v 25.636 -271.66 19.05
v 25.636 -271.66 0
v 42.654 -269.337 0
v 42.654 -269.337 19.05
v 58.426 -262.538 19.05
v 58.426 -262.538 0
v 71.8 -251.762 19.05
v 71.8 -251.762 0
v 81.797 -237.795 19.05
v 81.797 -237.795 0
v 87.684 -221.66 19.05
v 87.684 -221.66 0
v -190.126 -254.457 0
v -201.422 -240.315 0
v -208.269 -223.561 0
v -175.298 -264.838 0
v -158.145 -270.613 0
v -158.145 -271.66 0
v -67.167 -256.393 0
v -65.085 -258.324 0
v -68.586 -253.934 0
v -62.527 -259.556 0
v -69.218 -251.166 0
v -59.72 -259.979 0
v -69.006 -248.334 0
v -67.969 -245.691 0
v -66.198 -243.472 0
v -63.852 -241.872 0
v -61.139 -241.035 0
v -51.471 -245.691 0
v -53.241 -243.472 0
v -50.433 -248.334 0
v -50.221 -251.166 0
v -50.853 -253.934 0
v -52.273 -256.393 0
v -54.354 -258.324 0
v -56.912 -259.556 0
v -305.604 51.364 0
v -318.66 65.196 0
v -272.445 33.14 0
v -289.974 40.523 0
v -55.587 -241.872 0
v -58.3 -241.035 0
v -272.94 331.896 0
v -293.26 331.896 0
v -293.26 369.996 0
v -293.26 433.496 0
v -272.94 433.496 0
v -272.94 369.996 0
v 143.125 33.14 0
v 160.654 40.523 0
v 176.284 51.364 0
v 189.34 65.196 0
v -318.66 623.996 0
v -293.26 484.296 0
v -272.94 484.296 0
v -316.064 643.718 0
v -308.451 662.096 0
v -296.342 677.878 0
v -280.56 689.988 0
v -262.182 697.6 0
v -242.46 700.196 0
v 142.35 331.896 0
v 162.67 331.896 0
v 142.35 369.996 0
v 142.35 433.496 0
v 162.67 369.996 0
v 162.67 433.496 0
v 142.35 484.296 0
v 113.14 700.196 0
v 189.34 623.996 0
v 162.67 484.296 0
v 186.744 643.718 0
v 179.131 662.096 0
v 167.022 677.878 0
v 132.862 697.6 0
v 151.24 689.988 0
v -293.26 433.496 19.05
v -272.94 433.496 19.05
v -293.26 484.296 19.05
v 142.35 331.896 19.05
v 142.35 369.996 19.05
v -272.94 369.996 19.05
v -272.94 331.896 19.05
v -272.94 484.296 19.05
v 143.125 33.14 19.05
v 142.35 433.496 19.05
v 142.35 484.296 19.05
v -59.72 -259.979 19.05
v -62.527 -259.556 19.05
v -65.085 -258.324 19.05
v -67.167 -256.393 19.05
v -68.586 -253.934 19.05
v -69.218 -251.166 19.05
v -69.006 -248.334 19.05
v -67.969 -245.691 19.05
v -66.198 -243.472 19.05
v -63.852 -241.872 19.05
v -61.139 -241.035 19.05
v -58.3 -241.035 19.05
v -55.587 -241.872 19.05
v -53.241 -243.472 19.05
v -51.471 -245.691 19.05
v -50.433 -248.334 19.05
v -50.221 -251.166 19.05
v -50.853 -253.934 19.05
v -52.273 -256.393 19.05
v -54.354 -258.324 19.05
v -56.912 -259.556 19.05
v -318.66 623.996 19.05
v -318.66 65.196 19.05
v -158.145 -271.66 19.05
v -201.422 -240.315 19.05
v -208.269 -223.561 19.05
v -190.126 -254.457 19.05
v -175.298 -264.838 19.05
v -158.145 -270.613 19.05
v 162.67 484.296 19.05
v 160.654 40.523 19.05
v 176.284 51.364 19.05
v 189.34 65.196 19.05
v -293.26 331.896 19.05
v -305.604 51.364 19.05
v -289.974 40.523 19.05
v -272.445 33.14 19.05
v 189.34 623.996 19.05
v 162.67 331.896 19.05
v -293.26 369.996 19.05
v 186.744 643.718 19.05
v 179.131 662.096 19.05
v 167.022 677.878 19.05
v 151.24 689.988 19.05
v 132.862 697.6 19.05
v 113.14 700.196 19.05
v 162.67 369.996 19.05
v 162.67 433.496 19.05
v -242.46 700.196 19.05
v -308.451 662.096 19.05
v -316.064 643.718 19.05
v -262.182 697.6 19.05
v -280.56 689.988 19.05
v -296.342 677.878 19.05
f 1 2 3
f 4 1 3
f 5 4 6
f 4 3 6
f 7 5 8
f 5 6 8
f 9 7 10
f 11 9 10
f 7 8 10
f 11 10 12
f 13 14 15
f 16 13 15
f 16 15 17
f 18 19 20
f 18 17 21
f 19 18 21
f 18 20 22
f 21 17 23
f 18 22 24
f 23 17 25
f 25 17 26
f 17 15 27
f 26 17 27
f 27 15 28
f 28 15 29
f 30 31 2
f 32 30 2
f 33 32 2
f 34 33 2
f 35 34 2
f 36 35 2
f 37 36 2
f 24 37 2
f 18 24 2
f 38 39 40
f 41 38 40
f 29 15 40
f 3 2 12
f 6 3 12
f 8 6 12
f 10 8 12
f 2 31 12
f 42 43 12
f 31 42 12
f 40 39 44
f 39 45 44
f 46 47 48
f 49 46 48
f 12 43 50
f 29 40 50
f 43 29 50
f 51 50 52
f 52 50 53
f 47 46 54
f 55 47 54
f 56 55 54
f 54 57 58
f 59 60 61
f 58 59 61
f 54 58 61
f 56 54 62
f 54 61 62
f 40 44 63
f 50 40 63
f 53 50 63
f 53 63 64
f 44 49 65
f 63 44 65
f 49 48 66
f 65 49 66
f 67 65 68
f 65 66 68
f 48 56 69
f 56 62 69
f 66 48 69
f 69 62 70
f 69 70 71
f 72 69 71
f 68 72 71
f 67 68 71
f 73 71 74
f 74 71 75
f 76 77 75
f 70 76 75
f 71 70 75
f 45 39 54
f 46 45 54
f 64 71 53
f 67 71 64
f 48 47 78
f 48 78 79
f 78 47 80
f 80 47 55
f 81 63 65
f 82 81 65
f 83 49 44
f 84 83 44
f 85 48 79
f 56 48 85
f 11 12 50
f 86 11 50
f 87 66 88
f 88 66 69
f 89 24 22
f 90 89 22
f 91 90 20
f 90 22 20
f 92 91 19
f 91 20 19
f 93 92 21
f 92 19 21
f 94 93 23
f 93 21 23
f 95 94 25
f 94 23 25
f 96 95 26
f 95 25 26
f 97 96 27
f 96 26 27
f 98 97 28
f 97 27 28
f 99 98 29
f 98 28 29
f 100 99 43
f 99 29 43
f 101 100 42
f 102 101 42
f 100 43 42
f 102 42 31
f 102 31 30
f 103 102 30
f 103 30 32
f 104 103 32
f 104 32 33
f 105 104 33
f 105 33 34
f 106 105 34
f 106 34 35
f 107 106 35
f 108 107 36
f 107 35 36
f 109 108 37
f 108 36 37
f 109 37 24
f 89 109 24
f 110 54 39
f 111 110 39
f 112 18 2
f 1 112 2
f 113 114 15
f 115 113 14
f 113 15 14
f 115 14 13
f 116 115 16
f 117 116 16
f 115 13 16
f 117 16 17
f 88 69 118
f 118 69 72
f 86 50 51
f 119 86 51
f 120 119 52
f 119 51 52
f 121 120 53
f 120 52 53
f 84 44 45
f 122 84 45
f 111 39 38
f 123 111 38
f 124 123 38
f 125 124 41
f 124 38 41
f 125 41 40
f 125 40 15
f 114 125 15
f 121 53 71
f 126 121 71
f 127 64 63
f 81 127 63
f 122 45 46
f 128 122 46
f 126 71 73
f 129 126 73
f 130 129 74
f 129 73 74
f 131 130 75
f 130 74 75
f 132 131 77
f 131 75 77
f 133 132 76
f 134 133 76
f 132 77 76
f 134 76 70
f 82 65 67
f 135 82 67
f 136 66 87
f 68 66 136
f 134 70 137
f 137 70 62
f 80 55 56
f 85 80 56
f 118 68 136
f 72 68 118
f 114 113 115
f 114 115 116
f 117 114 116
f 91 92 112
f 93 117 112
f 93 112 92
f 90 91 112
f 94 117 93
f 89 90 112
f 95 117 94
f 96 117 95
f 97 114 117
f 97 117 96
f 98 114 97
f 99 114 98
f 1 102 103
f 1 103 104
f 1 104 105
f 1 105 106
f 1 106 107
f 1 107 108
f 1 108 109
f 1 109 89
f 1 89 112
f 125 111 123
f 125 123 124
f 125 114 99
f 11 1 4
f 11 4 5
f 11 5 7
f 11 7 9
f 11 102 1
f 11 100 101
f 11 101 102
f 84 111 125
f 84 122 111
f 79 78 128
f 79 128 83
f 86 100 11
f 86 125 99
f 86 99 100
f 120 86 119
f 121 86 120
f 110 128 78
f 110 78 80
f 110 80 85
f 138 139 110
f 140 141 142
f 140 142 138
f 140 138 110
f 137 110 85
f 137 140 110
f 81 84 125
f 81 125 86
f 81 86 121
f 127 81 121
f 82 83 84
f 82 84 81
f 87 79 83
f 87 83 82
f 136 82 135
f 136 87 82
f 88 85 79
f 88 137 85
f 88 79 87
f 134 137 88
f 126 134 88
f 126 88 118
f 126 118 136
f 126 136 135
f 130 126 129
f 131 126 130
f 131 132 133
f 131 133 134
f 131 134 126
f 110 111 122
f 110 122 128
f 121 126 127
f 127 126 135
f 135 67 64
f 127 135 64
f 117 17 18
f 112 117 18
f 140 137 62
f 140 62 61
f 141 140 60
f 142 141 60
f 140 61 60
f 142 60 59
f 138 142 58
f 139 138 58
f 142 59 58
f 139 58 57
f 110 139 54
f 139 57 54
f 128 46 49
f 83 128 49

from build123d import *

# Parameters (mm, degrees)
F0_W     = 20.32
F0_H     = 50.8
F1_DEPTH = 19.05
F2_DEPTH = 19.05
F3_DEPTH = 19.05


with BuildPart() as f1:
    # F0 (on Top) → F1 (new body)
    with BuildSketch(Plane.XY):
        Polygon((-242.4599993661, 535.0964056902), (-318.6599993661, 535.0964056902), (-318.6599993661, 331.8964056902), (-293.2599993661, 331.8964056902), (-293.2599993661, 369.9964056902), (-272.9399993661, 369.9964056902), (-272.9399993661, 331.8964056902), (-242.4599993661, 331.8964056902), (-242.4599993661, 369.9964056902), align=None)
        with Locations((-283.0999993661, 458.8964056902)):
            Rectangle(F0_W, F0_H, mode=Mode.SUBTRACT)
        with BuildLine():
            Line((-64.6599993661, 535.0964056902), (-242.4599993661, 535.0964056902))
            Line((-242.4599993661, 535.0964056902), (-242.4599993661, 369.9964056902))
            Line((-242.4599993661, 369.9964056902), (-242.4599993661, 331.8964056902))
            Line((-242.4599993661, 331.8964056902), (-272.9399993661, 331.8964056902))
            Line((-272.9399993661, 331.8964056902), (-293.2599993661, 331.8964056902))
            Line((-293.2599993661, 331.8964056902), (-318.6599993661, 331.8964056902))
            Line((-318.6599993661, 331.8964056902), (-318.6599993661, 65.1964056902))
            ThreePointArc((-318.6599993661, 65.1964056902), (-298.0708378663, 45.5374634714), (-272.4446494724, 33.1404457322))
            Line((-272.4446494724, 33.1404457322), (-208.2693964249, -223.5605664576))
            ThreePointArc((-208.2693964249, -223.5605664576), (-190.125501362, -254.4571248379), (-158.1446494724, -270.6133422236))
            ThreePointArc((-158.1446494724, -270.6133422236), (-152.4287869516, -271.3974603653), (-146.6653476657, -271.6595542678))
            Line((-146.6653476657, -271.6595542678), (-120.0446494724, -271.6595542678))
            Line((-120.0446494724, -271.6595542678), (-59.7196494724, -271.6595542678))
            Line((-59.7196494724, -271.6595542678), (0.6053505276, -271.6595542678))
            Line((0.6053505276, -271.6595542678), (25.6361325915, -271.6595542678))
            ThreePointArc((25.6361325915, -271.6595542678), (65.4793211523, -257.6041730378), (87.6843615354, -221.6601944351))
            Line((87.6843615354, -221.6601944351), (143.1246507402, 33.1404457322))
            ThreePointArc((143.1246507402, 33.1404457322), (168.7508391341, 45.5374634714), (189.3400006339, 65.1964056902))
            Line((189.3400006339, 65.1964056902), (189.3400006339, 331.8964056902))
            Line((189.3400006339, 331.8964056902), (163.9400006339, 331.8964056902))
            Line((163.9400006339, 331.8964056902), (162.6700006339, 331.8964056902))
            Line((162.6700006339, 331.8964056902), (142.3500006339, 331.8964056902))
            Line((142.3500006339, 331.8964056902), (113.1400006339, 331.8964056902))
            Line((113.1400006339, 331.8964056902), (113.1400006339, 369.9964056902))
            Line((113.1400006339, 369.9964056902), (113.1400006339, 535.0964056902))
            Line((113.1400006339, 535.0964056902), (-64.6599993661, 535.0964056902))
        make_face()
        with BuildLine():
            ThreePointArc((-50.1946494724, -250.4539787769), (-52.9844573816, -257.1891708677), (-59.7196494724, -259.9789787769))
            ThreePointArc((-59.7196494724, -259.9789787769), (-66.4548415632, -243.7187866861), (-50.1946494724, -250.4539787769))
        make_face(mode=Mode.SUBTRACT)
        Polygon((189.3400006339, 535.0964056902), (113.1400006339, 535.0964056902), (113.1400006339, 369.9964056902), (113.1400006339, 331.8964056902), (142.3500006339, 331.8964056902), (142.3500006339, 369.9964056902), (162.6700006339, 369.9964056902), (162.6700006339, 331.8964056902), (163.9400006339, 331.8964056902), (189.3400006339, 331.8964056902), align=None)
        with Locations((152.5100006339, 458.8964056902)):
            Rectangle(F0_W, F0_H, mode=Mode.SUBTRACT)
    extrude(amount=F1_DEPTH)

    # F0 (on Top) → F2 (join)
    with BuildSketch(Plane.XY):
        with BuildLine():
            Line((-318.6599993661, 623.9964056902), (-318.6599993661, 535.0964056902))
            Line((-318.6599993661, 535.0964056902), (-242.4599993661, 535.0964056902))
            Line((-242.4599993661, 535.0964056902), (-64.6599993661, 535.0964056902))
            Line((-64.6599993661, 535.0964056902), (113.1400006339, 535.0964056902))
            Line((113.1400006339, 535.0964056902), (189.3400006339, 535.0964056902))
            Line((189.3400006339, 535.0964056902), (189.3400006339, 623.9964056902))
            ThreePointArc((189.3400006339, 623.9964056902), (167.0215373603, 677.8779424166), (113.1400006339, 700.1964056902))
            Line((113.1400006339, 700.1964056902), (-242.4599993661, 700.1964056902))
            ThreePointArc((-242.4599993661, 700.1964056902), (-296.3415360925, 677.8779424166), (-318.6599993661, 623.9964056902))
        make_face()
        Polygon((-242.4599993661, 535.0964056902), (-318.6599993661, 535.0964056902), (-318.6599993661, 331.8964056902), (-293.2599993661, 331.8964056902), (-293.2599993661, 369.9964056902), (-272.9399993661, 369.9964056902), (-272.9399993661, 331.8964056902), (-242.4599993661, 331.8964056902), (-242.4599993661, 369.9964056902), align=None)
        with Locations((-283.0999993661, 458.8964056902)):
            Rectangle(F0_W, F0_H, mode=Mode.SUBTRACT)
        with BuildLine():
            Line((-64.6599993661, 535.0964056902), (-242.4599993661, 535.0964056902))
            Line((-242.4599993661, 535.0964056902), (-242.4599993661, 369.9964056902))
            Line((-242.4599993661, 369.9964056902), (-242.4599993661, 331.8964056902))
            Line((-242.4599993661, 331.8964056902), (-272.9399993661, 331.8964056902))
            Line((-272.9399993661, 331.8964056902), (-293.2599993661, 331.8964056902))
            Line((-293.2599993661, 331.8964056902), (-318.6599993661, 331.8964056902))
            Line((-318.6599993661, 331.8964056902), (-318.6599993661, 65.1964056902))
            ThreePointArc((-318.6599993661, 65.1964056902), (-298.0708378663, 45.5374634714), (-272.4446494724, 33.1404457322))
            Line((-272.4446494724, 33.1404457322), (-208.2693964249, -223.5605664576))
            ThreePointArc((-208.2693964249, -223.5605664576), (-190.125501362, -254.4571248379), (-158.1446494724, -270.6133422236))
            ThreePointArc((-158.1446494724, -270.6133422236), (-152.4287869516, -271.3974603653), (-146.6653476657, -271.6595542678))
            Line((-146.6653476657, -271.6595542678), (-120.0446494724, -271.6595542678))
            Line((-120.0446494724, -271.6595542678), (-59.7196494724, -271.6595542678))
            Line((-59.7196494724, -271.6595542678), (0.6053505276, -271.6595542678))
            Line((0.6053505276, -271.6595542678), (25.6361325915, -271.6595542678))
            ThreePointArc((25.6361325915, -271.6595542678), (65.4793211523, -257.6041730378), (87.6843615354, -221.6601944351))
            Line((87.6843615354, -221.6601944351), (143.1246507402, 33.1404457322))
            ThreePointArc((143.1246507402, 33.1404457322), (168.7508391341, 45.5374634714), (189.3400006339, 65.1964056902))
            Line((189.3400006339, 65.1964056902), (189.3400006339, 331.8964056902))
            Line((189.3400006339, 331.8964056902), (163.9400006339, 331.8964056902))
            Line((163.9400006339, 331.8964056902), (162.6700006339, 331.8964056902))
            Line((162.6700006339, 331.8964056902), (142.3500006339, 331.8964056902))
            Line((142.3500006339, 331.8964056902), (113.1400006339, 331.8964056902))
            Line((113.1400006339, 331.8964056902), (113.1400006339, 369.9964056902))
            Line((113.1400006339, 369.9964056902), (113.1400006339, 535.0964056902))
            Line((113.1400006339, 535.0964056902), (-64.6599993661, 535.0964056902))
        make_face()
        with BuildLine():
            ThreePointArc((-50.1946494724, -250.4539787769), (-52.9844573816, -257.1891708677), (-59.7196494724, -259.9789787769))
            ThreePointArc((-59.7196494724, -259.9789787769), (-66.4548415632, -243.7187866861), (-50.1946494724, -250.4539787769))
        make_face(mode=Mode.SUBTRACT)
        Polygon((189.3400006339, 535.0964056902), (113.1400006339, 535.0964056902), (113.1400006339, 369.9964056902), (113.1400006339, 331.8964056902), (142.3500006339, 331.8964056902), (142.3500006339, 369.9964056902), (162.6700006339, 369.9964056902), (162.6700006339, 331.8964056902), (163.9400006339, 331.8964056902), (189.3400006339, 331.8964056902), align=None)
        with Locations((152.5100006339, 458.8964056902)):
            Rectangle(F0_W, F0_H, mode=Mode.SUBTRACT)
        with BuildLine():
            ThreePointArc((-146.6653476657, -271.6595542678), (-152.4287869516, -271.3974603653), (-158.1446494724, -270.6133422236))
            Line((-158.1446494724, -270.6133422236), (-158.1446494724, -271.6595542678))
            Line((-158.1446494724, -271.6595542678), (-146.6653476657, -271.6595542678))
        make_face()
    extrude(amount=F2_DEPTH)

    # F0 (on Top) → F3 (join)
    with BuildSketch(Plane.XY):
        with BuildLine():
            Line((-318.6599993661, 623.9964056902), (-318.6599993661, 535.0964056902))
            Line((-318.6599993661, 535.0964056902), (-242.4599993661, 535.0964056902))
            Line((-242.4599993661, 535.0964056902), (-64.6599993661, 535.0964056902))
            Line((-64.6599993661, 535.0964056902), (113.1400006339, 535.0964056902))
            Line((113.1400006339, 535.0964056902), (189.3400006339, 535.0964056902))
            Line((189.3400006339, 535.0964056902), (189.3400006339, 623.9964056902))
            ThreePointArc((189.3400006339, 623.9964056902), (167.0215373603, 677.8779424166), (113.1400006339, 700.1964056902))
            Line((113.1400006339, 700.1964056902), (-242.4599993661, 700.1964056902))
            ThreePointArc((-242.4599993661, 700.1964056902), (-296.3415360925, 677.8779424166), (-318.6599993661, 623.9964056902))
        make_face()
        Polygon((-242.4599993661, 535.0964056902), (-318.6599993661, 535.0964056902), (-318.6599993661, 331.8964056902), (-293.2599993661, 331.8964056902), (-293.2599993661, 369.9964056902), (-272.9399993661, 369.9964056902), (-272.9399993661, 331.8964056902), (-242.4599993661, 331.8964056902), (-242.4599993661, 369.9964056902), align=None)
        with Locations((-283.0999993661, 458.8964056902)):
            Rectangle(F0_W, F0_H, mode=Mode.SUBTRACT)
        with BuildLine():
            Line((-64.6599993661, 535.0964056902), (-242.4599993661, 535.0964056902))
            Line((-242.4599993661, 535.0964056902), (-242.4599993661, 369.9964056902))
            Line((-242.4599993661, 369.9964056902), (-242.4599993661, 331.8964056902))
            Line((-242.4599993661, 331.8964056902), (-272.9399993661, 331.8964056902))
            Line((-272.9399993661, 331.8964056902), (-293.2599993661, 331.8964056902))
            Line((-293.2599993661, 331.8964056902), (-318.6599993661, 331.8964056902))
            Line((-318.6599993661, 331.8964056902), (-318.6599993661, 65.1964056902))
            ThreePointArc((-318.6599993661, 65.1964056902), (-298.0708378663, 45.5374634714), (-272.4446494724, 33.1404457322))
            Line((-272.4446494724, 33.1404457322), (-208.2693964249, -223.5605664576))
            ThreePointArc((-208.2693964249, -223.5605664576), (-190.125501362, -254.4571248379), (-158.1446494724, -270.6133422236))
            ThreePointArc((-158.1446494724, -270.6133422236), (-152.4287869516, -271.3974603653), (-146.6653476657, -271.6595542678))
            Line((-146.6653476657, -271.6595542678), (-120.0446494724, -271.6595542678))
            Line((-120.0446494724, -271.6595542678), (-59.7196494724, -271.6595542678))
            Line((-59.7196494724, -271.6595542678), (0.6053505276, -271.6595542678))
            Line((0.6053505276, -271.6595542678), (25.6361325915, -271.6595542678))
            ThreePointArc((25.6361325915, -271.6595542678), (65.4793211523, -257.6041730378), (87.6843615354, -221.6601944351))
            Line((87.6843615354, -221.6601944351), (143.1246507402, 33.1404457322))
            ThreePointArc((143.1246507402, 33.1404457322), (168.7508391341, 45.5374634714), (189.3400006339, 65.1964056902))
            Line((189.3400006339, 65.1964056902), (189.3400006339, 331.8964056902))
            Line((189.3400006339, 331.8964056902), (163.9400006339, 331.8964056902))
            Line((163.9400006339, 331.8964056902), (162.6700006339, 331.8964056902))
            Line((162.6700006339, 331.8964056902), (142.3500006339, 331.8964056902))
            Line((142.3500006339, 331.8964056902), (113.1400006339, 331.8964056902))
            Line((113.1400006339, 331.8964056902), (113.1400006339, 369.9964056902))
            Line((113.1400006339, 369.9964056902), (113.1400006339, 535.0964056902))
            Line((113.1400006339, 535.0964056902), (-64.6599993661, 535.0964056902))
        make_face()
        with BuildLine():
            ThreePointArc((-50.1946494724, -250.4539787769), (-52.9844573816, -257.1891708677), (-59.7196494724, -259.9789787769))
            ThreePointArc((-59.7196494724, -259.9789787769), (-66.4548415632, -243.7187866861), (-50.1946494724, -250.4539787769))
        make_face(mode=Mode.SUBTRACT)
        Polygon((189.3400006339, 535.0964056902), (113.1400006339, 535.0964056902), (113.1400006339, 369.9964056902), (113.1400006339, 331.8964056902), (142.3500006339, 331.8964056902), (142.3500006339, 369.9964056902), (162.6700006339, 369.9964056902), (162.6700006339, 331.8964056902), (163.9400006339, 331.8964056902), (189.3400006339, 331.8964056902), align=None)
        with Locations((152.5100006339, 458.8964056902)):
            Rectangle(F0_W, F0_H, mode=Mode.SUBTRACT)
        with BuildLine():
            ThreePointArc((-146.6653476657, -271.6595542678), (-152.4287869516, -271.3974603653), (-158.1446494724, -270.6133422236))
            Line((-158.1446494724, -270.6133422236), (-158.1446494724, -271.6595542678))
            Line((-158.1446494724, -271.6595542678), (-146.6653476657, -271.6595542678))
        make_face()
    extrude(amount=F3_DEPTH)


solid = f1.part
